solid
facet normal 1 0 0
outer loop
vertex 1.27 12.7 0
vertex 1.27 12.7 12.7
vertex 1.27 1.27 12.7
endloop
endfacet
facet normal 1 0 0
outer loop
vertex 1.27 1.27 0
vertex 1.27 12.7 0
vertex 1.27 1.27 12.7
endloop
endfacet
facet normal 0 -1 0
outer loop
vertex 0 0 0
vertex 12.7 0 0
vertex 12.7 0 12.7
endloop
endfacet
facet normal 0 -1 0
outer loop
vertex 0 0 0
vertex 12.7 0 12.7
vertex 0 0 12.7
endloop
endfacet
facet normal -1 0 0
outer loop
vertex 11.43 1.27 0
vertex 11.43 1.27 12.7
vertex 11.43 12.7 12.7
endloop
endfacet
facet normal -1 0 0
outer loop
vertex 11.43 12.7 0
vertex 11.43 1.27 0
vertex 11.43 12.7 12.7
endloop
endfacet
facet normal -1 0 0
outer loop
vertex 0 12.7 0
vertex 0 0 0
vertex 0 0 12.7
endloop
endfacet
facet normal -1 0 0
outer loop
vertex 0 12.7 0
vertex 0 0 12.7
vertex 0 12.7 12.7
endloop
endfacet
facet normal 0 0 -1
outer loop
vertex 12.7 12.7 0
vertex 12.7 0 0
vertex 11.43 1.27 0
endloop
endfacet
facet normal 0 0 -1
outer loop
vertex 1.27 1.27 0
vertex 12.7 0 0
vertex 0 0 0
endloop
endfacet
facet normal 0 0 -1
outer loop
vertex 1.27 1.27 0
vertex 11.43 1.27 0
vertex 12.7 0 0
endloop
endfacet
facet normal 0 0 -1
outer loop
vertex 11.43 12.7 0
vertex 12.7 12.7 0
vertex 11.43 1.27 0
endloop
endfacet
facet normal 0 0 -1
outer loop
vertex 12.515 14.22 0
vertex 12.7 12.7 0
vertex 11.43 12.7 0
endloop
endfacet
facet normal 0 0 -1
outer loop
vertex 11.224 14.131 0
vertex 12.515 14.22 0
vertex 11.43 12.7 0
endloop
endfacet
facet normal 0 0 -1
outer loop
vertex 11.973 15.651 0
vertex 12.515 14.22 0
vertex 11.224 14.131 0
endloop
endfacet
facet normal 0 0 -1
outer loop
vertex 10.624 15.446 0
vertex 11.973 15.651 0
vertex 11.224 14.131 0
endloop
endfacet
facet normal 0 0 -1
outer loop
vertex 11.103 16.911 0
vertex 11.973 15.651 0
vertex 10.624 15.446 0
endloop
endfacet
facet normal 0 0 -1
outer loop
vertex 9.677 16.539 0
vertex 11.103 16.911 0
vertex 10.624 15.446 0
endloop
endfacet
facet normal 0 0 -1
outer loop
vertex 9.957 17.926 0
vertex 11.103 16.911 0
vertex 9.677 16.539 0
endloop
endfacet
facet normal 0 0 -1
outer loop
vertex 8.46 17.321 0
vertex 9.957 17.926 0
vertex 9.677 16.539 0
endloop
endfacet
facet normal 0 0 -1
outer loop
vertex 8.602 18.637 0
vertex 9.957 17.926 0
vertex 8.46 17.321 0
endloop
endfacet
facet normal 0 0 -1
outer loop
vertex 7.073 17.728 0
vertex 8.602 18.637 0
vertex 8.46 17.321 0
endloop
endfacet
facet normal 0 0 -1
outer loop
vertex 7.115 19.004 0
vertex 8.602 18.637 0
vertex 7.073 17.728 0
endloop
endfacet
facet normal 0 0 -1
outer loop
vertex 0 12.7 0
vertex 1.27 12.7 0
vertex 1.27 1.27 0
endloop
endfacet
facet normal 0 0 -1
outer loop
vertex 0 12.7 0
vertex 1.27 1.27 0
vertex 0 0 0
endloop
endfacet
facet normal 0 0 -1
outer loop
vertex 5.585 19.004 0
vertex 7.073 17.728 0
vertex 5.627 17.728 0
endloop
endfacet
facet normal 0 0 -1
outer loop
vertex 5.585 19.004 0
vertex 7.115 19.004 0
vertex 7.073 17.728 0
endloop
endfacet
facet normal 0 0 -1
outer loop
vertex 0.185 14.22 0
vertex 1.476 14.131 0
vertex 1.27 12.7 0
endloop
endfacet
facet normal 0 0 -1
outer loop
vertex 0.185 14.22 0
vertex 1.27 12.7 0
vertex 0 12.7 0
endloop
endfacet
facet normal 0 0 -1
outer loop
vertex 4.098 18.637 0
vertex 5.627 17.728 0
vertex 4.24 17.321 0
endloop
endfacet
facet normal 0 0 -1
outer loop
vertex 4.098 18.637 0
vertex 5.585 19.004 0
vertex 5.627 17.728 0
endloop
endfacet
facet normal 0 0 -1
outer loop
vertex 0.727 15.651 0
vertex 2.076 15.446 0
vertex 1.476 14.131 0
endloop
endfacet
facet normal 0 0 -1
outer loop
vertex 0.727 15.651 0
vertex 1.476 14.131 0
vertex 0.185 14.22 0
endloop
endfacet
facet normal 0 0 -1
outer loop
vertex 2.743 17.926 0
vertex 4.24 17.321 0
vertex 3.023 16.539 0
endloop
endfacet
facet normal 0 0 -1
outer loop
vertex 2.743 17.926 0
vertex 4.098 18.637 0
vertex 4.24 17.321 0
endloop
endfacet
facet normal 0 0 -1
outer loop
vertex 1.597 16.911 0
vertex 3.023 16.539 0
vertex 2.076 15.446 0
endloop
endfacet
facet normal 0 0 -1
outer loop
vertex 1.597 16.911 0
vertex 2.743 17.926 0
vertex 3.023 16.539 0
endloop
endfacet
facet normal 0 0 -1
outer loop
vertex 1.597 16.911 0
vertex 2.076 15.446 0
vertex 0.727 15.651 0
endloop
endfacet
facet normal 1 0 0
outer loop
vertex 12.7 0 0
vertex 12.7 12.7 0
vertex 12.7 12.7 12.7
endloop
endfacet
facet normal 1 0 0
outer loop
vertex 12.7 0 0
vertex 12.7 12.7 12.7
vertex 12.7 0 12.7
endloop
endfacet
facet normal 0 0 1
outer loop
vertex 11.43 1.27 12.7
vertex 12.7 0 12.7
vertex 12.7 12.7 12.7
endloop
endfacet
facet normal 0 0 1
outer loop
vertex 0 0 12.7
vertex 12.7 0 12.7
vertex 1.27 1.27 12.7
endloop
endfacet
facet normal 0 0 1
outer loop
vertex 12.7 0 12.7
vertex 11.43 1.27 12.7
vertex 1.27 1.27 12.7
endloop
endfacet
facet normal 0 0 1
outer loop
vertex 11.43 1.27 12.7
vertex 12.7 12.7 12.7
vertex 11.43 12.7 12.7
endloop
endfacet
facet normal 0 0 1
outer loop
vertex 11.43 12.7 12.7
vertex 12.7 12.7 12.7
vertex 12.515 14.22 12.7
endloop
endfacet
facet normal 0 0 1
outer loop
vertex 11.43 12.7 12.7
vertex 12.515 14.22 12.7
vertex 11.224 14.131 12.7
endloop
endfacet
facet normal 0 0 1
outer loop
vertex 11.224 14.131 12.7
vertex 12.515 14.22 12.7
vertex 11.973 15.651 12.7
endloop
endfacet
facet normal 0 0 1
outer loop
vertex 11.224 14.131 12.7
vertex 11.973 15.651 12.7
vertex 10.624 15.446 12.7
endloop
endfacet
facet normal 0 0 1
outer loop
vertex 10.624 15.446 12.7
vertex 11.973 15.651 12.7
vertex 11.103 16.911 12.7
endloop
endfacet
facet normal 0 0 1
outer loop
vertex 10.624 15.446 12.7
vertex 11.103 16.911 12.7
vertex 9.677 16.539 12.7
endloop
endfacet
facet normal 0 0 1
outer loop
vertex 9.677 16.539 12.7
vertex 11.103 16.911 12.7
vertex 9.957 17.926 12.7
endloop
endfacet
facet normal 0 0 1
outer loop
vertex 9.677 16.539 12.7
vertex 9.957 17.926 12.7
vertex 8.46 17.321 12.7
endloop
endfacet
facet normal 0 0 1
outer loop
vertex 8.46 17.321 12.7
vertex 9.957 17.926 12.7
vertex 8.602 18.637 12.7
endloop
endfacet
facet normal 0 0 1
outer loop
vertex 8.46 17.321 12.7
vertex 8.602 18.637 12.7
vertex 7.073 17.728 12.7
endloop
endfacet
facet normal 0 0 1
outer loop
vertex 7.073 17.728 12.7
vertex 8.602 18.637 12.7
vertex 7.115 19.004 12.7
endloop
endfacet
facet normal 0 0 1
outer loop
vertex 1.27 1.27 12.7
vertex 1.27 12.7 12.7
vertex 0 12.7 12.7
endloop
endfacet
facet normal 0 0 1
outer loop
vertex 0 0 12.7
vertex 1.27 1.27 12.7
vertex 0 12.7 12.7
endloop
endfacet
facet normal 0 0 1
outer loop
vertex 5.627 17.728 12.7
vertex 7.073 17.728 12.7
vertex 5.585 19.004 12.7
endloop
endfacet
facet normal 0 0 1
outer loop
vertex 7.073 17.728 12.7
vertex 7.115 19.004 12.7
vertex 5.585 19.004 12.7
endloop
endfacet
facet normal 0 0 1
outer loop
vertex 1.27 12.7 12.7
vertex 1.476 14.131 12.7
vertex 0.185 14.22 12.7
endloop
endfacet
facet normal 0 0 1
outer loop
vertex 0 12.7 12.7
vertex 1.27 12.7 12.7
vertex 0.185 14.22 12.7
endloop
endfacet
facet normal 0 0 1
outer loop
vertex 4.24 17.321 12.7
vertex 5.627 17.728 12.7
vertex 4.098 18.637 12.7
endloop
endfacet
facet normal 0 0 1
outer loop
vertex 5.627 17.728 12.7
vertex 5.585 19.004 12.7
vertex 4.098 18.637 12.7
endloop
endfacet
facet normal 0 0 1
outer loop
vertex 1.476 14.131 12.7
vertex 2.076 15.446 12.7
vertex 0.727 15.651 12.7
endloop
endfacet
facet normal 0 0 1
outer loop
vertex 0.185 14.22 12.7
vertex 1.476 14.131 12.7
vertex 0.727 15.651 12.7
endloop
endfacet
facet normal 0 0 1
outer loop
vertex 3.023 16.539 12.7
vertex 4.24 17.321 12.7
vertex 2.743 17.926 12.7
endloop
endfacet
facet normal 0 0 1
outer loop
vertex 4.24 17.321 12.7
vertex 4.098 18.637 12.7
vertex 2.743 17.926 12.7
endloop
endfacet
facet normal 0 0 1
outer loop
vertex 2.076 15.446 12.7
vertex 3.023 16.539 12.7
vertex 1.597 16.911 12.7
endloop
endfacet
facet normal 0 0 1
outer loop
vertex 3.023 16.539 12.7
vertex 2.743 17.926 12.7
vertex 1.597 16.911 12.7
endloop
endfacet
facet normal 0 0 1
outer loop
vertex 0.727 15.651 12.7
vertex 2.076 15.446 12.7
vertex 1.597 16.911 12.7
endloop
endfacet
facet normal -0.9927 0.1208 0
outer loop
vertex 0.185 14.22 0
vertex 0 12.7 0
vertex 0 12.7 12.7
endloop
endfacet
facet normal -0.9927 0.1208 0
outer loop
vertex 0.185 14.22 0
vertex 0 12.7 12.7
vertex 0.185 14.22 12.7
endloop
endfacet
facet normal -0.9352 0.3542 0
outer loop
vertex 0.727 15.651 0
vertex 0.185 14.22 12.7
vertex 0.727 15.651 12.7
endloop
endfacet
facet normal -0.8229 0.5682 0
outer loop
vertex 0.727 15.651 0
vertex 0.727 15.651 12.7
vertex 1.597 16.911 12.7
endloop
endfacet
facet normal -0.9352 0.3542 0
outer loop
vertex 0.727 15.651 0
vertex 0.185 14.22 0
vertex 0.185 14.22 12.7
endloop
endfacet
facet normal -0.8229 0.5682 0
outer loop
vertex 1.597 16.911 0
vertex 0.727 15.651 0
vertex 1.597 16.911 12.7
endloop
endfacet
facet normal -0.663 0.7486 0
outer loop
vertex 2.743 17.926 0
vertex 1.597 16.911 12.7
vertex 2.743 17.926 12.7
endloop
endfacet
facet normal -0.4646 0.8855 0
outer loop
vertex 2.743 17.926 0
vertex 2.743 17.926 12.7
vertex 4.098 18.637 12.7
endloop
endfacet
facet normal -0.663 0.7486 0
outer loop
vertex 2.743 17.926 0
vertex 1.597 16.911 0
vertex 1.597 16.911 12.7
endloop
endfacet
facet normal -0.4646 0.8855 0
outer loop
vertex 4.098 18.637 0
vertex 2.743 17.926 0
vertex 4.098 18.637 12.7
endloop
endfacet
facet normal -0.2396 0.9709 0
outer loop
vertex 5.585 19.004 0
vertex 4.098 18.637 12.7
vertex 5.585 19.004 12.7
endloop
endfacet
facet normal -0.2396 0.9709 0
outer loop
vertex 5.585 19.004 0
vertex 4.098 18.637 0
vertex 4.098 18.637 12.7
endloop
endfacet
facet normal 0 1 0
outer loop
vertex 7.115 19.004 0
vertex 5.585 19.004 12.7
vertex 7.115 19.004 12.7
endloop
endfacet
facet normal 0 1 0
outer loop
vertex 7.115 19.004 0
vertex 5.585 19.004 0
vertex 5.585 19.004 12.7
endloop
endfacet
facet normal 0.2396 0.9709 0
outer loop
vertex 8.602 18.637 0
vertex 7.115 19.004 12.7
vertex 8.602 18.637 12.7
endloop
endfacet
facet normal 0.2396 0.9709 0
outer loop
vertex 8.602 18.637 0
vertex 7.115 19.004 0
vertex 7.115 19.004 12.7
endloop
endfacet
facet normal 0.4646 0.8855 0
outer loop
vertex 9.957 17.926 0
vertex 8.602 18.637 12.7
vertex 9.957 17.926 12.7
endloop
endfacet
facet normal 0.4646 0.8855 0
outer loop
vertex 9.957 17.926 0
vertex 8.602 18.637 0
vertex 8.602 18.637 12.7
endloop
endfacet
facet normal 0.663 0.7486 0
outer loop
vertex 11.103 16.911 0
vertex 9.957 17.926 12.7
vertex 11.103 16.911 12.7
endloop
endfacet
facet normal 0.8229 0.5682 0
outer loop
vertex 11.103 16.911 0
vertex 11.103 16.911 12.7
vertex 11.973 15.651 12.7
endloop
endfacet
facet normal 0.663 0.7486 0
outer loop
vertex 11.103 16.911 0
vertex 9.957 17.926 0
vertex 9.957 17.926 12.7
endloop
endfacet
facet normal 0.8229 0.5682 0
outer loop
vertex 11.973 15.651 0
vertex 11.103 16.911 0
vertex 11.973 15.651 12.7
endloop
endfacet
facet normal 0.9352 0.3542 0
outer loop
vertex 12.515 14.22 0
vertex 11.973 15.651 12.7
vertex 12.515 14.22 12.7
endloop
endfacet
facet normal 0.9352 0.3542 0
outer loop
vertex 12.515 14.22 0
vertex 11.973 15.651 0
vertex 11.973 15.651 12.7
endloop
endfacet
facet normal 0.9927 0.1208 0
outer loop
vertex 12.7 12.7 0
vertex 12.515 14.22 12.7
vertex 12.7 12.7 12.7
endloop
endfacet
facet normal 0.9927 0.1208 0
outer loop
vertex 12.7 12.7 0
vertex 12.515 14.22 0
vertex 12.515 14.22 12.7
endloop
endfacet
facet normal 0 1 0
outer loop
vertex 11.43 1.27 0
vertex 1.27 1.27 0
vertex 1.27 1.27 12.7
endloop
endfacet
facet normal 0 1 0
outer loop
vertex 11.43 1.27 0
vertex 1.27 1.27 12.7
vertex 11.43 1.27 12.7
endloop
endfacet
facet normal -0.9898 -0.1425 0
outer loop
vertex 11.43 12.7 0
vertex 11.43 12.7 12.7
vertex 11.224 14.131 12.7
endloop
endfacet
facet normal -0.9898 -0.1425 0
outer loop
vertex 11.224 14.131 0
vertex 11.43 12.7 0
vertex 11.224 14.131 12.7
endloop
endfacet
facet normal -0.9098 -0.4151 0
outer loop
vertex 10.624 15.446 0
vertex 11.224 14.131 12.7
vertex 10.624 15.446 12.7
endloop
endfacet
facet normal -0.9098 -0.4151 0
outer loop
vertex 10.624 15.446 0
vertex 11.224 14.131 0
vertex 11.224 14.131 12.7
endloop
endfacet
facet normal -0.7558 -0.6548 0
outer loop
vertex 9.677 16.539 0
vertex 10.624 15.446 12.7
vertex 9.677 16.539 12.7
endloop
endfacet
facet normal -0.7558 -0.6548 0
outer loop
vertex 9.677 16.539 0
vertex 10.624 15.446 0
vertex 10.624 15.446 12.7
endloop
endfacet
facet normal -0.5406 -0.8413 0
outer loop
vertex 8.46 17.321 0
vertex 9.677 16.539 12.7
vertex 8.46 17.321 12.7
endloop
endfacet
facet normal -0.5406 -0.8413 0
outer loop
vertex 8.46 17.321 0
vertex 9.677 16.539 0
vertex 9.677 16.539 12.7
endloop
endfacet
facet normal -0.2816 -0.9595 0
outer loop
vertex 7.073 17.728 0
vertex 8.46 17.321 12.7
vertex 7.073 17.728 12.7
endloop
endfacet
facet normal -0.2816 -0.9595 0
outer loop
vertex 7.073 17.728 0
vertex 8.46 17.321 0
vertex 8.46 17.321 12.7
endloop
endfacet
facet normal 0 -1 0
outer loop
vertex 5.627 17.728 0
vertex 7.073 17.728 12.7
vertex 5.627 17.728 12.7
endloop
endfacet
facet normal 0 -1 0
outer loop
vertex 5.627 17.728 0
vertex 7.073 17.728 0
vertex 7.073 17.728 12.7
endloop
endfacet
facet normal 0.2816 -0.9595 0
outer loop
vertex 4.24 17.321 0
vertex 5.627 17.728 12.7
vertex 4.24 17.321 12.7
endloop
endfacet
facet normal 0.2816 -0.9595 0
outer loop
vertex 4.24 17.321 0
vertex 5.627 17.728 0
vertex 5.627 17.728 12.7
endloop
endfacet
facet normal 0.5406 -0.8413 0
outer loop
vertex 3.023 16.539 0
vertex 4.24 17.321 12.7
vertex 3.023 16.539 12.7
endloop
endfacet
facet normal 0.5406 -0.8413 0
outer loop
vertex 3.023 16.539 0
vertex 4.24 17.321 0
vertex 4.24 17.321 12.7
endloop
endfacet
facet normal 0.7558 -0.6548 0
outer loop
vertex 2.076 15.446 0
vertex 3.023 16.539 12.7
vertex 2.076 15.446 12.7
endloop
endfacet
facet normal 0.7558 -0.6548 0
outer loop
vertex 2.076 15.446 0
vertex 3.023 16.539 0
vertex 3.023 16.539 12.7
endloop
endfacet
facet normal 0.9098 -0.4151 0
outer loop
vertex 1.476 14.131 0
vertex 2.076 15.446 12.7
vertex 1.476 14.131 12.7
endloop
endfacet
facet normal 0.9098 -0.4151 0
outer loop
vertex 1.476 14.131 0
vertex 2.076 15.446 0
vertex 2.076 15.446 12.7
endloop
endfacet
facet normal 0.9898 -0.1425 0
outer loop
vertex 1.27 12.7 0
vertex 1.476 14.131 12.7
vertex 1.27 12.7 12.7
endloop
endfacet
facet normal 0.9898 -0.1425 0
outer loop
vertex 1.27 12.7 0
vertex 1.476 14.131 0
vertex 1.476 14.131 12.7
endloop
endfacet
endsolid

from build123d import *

# Parameters (mm, degrees)
BOSS_EXTRUDE1_DEPTH = 12.7


with BuildPart() as part:
    # Sketch1 → Boss-Extrude1 (new body)
    with BuildSketch(Plane.XY):
        with BuildLine():
            Line((0, 0), (0, 12.7))
            ThreePointArc((0, 12.7), (6.35, 19.05), (12.7, 12.7))
            Line((12.7, 12.7), (12.7, 0))
            Line((12.7, 0), (0, 0))
        make_face()
        with BuildLine():
            Line((1.27, 1.27), (11.43, 1.27))
            Line((11.43, 1.27), (11.43, 12.7))
            ThreePointArc((11.43, 12.7), (6.35, 17.78), (1.27, 12.7))
            Line((1.27, 12.7), (1.27, 1.27))
        make_face(mode=Mode.SUBTRACT)
    extrude(amount=BOSS_EXTRUDE1_DEPTH)


solid = part.part
